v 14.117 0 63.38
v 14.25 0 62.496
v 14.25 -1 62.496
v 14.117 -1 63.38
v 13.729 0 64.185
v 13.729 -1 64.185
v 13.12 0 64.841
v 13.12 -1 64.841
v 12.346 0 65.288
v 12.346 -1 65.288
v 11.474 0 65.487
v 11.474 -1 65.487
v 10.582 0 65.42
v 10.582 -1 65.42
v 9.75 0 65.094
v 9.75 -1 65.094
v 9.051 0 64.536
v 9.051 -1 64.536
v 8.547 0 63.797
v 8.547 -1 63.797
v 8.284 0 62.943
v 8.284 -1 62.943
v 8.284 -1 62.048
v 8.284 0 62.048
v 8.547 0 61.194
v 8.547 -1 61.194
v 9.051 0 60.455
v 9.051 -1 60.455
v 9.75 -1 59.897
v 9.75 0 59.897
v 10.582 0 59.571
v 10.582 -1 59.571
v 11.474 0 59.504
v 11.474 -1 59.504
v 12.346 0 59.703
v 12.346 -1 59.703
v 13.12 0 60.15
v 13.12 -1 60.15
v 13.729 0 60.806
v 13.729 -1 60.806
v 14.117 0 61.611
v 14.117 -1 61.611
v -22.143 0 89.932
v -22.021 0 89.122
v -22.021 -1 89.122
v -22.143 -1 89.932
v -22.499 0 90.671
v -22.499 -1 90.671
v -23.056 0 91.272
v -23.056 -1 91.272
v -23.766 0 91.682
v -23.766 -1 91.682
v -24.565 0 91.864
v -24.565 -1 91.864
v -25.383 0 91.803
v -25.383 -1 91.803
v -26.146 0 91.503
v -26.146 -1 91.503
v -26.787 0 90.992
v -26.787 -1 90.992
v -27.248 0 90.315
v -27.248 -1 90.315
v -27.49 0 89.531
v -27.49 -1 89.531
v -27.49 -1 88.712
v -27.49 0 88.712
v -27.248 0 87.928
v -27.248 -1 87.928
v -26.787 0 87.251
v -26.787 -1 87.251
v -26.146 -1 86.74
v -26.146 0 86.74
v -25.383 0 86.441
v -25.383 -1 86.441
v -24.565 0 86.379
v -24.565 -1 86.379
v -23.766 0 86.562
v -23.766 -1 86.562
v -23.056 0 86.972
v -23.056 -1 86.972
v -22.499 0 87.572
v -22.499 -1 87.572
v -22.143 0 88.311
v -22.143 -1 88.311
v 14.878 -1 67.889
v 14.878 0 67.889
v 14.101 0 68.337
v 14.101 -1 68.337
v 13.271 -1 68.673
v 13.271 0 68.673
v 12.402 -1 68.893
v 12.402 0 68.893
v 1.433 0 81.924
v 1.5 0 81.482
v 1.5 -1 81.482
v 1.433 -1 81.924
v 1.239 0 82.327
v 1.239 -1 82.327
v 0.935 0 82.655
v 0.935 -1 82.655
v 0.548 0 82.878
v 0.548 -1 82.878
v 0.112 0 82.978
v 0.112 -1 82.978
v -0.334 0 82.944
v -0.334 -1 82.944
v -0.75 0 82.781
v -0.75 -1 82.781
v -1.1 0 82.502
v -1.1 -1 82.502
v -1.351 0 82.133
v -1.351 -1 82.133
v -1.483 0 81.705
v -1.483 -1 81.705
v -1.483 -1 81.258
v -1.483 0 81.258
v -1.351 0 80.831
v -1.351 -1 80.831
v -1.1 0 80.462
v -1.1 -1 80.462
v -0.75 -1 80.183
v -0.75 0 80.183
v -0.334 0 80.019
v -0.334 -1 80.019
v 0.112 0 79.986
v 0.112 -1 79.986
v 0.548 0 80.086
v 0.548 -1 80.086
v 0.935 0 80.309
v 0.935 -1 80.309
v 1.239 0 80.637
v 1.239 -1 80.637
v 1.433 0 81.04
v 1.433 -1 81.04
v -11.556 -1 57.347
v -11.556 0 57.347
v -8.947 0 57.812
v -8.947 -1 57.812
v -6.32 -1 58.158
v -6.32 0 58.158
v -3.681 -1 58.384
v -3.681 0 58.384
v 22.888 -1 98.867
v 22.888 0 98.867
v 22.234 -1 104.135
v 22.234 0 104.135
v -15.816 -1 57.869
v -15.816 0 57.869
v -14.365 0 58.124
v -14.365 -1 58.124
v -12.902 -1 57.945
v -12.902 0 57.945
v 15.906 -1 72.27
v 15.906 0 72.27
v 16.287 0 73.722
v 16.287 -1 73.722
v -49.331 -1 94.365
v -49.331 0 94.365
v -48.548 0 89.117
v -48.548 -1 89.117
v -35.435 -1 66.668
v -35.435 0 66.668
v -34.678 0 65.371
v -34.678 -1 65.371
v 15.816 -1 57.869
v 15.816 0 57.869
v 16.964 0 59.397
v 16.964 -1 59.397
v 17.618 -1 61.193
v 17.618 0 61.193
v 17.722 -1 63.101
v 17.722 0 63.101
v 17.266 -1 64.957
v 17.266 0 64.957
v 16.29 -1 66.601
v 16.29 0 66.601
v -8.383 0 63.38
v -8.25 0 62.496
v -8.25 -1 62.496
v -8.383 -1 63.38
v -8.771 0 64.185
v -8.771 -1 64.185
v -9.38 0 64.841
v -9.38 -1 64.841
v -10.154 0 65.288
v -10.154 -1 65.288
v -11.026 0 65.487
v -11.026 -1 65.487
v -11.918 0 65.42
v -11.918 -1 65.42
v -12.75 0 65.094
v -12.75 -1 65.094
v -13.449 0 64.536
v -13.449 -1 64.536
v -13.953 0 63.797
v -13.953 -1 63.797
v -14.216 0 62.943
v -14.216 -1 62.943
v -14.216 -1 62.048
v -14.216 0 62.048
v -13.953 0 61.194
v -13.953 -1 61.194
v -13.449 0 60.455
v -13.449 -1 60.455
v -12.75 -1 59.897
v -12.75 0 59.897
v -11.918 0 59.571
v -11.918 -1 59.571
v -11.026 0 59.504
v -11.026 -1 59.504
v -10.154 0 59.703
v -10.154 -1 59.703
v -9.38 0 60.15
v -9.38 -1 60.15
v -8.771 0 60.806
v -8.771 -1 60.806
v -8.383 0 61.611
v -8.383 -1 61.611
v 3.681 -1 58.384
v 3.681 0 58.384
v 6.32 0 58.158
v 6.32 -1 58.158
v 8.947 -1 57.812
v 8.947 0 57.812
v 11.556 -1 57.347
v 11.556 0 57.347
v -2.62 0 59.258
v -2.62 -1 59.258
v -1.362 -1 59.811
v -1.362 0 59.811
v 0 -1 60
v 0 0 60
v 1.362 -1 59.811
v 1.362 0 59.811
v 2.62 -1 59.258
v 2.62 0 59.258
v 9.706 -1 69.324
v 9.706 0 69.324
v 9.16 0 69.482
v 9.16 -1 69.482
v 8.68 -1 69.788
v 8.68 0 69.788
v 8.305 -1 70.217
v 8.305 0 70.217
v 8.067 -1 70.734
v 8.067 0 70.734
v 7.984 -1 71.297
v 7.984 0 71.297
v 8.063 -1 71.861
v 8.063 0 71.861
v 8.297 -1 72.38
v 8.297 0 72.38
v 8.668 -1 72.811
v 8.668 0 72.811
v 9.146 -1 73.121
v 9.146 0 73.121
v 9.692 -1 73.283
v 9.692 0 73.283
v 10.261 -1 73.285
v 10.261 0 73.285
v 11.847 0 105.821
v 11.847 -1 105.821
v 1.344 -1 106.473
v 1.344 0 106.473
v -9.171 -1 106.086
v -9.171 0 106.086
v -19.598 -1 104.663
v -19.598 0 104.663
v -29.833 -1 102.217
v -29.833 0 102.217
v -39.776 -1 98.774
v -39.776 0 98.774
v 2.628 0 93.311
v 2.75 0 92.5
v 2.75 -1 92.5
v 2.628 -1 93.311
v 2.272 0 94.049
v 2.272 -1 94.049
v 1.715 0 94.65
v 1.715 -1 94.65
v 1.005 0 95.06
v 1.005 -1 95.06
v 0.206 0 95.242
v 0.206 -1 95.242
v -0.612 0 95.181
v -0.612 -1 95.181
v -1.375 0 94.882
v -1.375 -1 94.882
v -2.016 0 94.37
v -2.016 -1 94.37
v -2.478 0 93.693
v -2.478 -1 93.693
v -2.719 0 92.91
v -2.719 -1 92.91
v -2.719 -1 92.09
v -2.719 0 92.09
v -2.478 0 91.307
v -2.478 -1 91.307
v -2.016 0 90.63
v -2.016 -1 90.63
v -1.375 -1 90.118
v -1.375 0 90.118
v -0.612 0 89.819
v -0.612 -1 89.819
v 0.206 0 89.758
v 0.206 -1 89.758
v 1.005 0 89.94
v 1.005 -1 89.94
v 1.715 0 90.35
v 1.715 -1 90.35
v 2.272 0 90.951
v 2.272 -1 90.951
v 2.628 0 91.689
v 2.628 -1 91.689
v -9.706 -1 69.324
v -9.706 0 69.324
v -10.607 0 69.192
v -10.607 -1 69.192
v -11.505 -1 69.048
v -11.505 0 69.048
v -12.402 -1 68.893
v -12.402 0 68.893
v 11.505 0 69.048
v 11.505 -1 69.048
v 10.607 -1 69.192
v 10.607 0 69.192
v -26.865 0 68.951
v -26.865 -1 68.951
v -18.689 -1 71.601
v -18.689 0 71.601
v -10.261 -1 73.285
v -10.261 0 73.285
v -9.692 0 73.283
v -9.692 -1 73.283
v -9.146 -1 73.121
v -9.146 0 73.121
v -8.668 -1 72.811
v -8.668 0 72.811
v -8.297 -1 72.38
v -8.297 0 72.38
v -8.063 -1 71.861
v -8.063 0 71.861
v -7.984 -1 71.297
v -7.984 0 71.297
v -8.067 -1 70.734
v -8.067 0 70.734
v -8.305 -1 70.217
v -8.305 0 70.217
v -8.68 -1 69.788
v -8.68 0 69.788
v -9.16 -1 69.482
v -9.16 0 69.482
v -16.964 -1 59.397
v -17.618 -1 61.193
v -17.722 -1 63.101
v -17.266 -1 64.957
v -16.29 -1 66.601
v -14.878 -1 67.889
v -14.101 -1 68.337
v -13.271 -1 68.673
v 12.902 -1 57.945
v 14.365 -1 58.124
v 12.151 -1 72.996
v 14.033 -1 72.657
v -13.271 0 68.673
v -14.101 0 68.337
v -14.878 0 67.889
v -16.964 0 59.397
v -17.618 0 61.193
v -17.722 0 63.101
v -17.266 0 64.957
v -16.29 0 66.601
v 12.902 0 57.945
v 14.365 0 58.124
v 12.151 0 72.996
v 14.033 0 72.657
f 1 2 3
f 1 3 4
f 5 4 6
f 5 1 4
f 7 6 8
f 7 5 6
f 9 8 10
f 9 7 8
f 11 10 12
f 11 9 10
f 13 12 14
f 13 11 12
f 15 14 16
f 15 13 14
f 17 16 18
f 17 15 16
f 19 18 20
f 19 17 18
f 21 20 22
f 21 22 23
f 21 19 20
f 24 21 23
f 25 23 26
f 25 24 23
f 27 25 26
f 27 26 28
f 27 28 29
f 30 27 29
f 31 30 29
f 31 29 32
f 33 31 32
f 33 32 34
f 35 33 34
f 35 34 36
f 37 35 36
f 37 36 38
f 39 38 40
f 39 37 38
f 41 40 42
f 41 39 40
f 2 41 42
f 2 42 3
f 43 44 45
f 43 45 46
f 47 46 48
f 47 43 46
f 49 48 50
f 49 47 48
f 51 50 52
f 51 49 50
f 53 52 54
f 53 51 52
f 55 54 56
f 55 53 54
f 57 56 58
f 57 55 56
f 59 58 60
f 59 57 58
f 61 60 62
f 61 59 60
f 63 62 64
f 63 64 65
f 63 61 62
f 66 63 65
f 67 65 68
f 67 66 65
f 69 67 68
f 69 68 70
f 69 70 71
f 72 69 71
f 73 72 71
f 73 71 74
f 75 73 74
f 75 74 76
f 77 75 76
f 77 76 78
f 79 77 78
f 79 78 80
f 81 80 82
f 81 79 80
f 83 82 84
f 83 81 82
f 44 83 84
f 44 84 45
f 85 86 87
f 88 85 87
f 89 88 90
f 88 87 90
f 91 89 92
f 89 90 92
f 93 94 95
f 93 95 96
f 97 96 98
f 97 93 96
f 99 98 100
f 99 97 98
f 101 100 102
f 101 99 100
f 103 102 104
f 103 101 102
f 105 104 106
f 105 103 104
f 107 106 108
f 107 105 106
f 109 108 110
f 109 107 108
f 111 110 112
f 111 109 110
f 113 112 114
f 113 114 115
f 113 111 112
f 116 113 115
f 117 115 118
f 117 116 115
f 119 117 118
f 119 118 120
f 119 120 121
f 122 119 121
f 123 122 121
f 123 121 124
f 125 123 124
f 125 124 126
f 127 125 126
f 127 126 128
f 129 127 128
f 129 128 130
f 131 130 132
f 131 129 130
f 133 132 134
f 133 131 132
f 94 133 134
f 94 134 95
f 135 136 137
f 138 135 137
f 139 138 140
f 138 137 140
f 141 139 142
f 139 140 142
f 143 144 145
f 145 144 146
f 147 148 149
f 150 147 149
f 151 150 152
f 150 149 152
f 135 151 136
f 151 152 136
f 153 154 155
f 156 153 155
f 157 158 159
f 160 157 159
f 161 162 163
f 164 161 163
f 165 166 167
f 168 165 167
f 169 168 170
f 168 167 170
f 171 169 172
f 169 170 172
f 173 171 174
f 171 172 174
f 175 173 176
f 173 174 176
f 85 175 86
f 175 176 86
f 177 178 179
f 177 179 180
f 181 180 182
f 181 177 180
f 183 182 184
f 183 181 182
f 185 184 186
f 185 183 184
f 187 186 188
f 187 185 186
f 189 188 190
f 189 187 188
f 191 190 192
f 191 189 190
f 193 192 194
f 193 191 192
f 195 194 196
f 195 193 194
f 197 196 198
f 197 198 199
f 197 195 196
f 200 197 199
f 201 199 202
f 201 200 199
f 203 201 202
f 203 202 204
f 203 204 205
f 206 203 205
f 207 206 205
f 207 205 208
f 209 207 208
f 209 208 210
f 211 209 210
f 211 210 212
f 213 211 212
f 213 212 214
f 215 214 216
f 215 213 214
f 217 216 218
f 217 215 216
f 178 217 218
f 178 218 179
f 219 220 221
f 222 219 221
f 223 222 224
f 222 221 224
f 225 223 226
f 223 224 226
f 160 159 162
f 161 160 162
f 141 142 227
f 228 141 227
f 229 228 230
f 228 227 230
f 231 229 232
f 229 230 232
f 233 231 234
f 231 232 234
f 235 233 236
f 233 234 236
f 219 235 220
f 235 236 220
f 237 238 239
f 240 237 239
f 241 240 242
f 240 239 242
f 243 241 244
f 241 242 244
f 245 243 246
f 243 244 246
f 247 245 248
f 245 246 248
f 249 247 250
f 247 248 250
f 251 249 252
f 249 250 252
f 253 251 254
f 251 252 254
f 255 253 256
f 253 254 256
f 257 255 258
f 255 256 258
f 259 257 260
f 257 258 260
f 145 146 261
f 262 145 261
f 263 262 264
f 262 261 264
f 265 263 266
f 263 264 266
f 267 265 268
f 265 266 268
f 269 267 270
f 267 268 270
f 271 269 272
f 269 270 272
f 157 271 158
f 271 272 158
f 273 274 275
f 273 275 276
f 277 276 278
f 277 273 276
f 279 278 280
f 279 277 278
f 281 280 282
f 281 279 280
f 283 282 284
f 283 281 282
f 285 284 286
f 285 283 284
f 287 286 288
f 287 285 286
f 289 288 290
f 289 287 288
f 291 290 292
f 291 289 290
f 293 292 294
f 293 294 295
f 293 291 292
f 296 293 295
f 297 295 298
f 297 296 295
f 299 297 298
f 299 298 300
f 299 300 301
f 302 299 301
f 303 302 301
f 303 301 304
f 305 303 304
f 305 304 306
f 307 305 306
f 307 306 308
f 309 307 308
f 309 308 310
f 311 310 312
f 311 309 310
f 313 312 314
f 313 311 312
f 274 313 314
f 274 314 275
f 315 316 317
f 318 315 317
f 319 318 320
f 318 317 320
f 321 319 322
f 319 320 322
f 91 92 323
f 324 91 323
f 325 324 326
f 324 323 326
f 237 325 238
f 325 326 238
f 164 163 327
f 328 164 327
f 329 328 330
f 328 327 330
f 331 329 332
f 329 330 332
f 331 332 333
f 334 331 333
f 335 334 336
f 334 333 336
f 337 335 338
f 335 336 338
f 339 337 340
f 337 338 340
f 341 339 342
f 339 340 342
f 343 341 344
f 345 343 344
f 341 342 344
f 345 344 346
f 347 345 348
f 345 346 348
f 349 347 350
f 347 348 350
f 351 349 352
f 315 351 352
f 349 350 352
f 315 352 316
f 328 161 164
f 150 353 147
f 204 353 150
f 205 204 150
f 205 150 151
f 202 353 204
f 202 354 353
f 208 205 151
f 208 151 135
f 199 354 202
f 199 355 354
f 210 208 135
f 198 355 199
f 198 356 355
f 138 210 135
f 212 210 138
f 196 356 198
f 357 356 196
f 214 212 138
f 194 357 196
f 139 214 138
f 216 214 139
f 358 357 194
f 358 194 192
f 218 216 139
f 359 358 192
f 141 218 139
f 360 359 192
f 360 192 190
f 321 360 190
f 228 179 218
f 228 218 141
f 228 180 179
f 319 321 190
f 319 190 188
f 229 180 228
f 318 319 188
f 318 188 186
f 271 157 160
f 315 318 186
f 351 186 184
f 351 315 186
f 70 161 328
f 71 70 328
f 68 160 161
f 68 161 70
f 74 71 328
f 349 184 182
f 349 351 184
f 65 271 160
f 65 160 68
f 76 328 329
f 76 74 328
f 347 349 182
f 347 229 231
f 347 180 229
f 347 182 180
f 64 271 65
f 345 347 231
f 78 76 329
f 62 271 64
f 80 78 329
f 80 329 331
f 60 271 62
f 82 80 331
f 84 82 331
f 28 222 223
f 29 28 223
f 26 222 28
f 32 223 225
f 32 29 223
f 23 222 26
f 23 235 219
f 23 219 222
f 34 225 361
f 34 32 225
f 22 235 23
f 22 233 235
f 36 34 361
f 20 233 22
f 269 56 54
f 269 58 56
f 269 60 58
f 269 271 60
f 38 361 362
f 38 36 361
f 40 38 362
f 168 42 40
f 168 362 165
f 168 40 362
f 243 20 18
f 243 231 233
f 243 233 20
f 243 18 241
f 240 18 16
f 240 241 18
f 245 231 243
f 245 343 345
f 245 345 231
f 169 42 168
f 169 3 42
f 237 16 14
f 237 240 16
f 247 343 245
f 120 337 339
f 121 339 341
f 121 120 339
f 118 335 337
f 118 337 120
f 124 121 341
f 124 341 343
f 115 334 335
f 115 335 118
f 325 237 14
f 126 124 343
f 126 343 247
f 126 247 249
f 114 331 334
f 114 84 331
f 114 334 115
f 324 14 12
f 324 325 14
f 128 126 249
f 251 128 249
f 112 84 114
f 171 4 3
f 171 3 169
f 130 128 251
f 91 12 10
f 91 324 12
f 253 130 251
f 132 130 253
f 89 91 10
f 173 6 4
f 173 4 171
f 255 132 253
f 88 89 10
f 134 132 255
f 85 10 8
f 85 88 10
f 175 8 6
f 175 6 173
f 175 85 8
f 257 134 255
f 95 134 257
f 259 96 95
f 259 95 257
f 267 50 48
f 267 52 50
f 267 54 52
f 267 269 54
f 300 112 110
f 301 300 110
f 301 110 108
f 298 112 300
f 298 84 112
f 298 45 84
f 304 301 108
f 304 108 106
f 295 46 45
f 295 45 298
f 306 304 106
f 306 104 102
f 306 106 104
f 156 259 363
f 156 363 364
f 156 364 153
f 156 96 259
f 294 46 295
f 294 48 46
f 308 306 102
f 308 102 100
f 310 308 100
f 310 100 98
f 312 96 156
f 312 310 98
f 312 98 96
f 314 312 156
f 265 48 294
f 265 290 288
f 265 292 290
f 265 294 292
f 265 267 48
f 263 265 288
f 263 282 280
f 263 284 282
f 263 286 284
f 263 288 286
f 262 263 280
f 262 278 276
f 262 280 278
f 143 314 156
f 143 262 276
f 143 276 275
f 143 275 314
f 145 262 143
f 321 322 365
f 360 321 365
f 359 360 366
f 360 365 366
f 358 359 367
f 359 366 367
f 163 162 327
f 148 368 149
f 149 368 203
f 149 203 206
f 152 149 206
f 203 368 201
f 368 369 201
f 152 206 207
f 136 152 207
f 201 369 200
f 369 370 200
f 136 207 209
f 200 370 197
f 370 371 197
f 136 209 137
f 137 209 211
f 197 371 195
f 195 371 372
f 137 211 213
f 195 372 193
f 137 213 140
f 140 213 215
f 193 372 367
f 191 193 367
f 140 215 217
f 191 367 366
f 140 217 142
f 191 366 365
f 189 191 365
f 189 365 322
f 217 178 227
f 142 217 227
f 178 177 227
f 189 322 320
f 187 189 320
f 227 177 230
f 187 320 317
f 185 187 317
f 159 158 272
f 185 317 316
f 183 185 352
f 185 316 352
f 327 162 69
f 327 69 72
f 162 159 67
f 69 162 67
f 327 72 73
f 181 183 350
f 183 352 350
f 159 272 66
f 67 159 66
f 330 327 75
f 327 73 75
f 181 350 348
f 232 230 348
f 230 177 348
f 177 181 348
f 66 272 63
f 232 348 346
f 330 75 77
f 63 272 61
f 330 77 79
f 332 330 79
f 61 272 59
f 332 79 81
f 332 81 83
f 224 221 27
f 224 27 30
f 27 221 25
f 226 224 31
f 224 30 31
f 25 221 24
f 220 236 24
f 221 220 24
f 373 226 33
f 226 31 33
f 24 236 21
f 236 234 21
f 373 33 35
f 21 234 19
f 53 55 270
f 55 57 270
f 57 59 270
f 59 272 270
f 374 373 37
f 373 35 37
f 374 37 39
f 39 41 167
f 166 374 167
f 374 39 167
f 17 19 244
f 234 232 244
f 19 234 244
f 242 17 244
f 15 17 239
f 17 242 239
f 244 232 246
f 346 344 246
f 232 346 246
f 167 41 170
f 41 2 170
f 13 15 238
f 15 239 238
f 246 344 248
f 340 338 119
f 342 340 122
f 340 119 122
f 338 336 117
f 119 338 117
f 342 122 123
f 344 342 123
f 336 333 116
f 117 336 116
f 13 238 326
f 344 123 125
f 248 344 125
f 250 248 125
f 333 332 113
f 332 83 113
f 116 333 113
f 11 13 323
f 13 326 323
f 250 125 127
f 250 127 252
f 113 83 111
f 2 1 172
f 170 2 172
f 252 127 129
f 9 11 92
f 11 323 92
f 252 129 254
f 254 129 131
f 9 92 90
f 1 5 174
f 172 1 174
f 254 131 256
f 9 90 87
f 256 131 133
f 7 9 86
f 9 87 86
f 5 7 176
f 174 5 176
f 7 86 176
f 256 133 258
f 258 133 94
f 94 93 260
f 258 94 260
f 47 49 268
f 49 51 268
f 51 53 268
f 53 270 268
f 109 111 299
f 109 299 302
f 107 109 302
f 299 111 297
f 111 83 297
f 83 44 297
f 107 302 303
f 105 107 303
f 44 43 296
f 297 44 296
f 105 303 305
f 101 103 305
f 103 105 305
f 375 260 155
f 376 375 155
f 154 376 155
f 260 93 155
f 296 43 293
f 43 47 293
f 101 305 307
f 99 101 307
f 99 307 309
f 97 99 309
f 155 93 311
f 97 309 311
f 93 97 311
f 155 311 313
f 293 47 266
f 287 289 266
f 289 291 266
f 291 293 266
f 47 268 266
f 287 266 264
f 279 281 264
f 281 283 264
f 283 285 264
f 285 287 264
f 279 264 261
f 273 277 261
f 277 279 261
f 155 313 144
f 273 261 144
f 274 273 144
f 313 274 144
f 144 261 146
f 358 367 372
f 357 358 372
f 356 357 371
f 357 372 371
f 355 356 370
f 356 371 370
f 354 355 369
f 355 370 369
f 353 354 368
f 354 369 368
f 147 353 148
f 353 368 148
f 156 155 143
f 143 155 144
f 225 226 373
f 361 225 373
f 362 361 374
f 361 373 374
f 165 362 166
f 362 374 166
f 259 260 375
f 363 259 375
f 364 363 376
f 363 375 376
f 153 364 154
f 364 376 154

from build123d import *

# Parameters (mm, degrees)
F0_R     = 3
F0_R_2   = 2.75
F0_R_3   = 1.5
F1_DEPTH = 1


# Not quite as in the source:
# - ends of sketch curves that miss each other by under 0.0002 mm in the source are joined


with BuildPart() as f1:
    # F0 (on Front) → F1 (new body)
    with BuildSketch(Plane.XZ):
        with BuildLine():
            ThreePointArc((10.2610980266, 73.2851271902), (13.0931802752, 72.8324696154), (15.9055950445, 72.2704092024))
            Line((15.9055950445, 72.2704092024), (16.286797, 73.722386))
            Line((16.286797, 73.722386), (22.888167, 98.86666))
            Line((22.888167, 98.86666), (22.234036, 104.134663))
            ThreePointArc((22.234036, 104.134663), (-14.4021915305, 105.5033516635), (-49.3311389264, 94.3653488593))
            Line((-49.3311389264, 94.3653488593), (-48.548236, 89.117403))
            Line((-48.548236, 89.117403), (-35.435226, 66.667794))
            Line((-35.435226, 66.667794), (-34.67805, 65.371499))
            ThreePointArc((-34.67805, 65.371499), (-22.8153047874, 70.3950414977), (-10.2610980266, 73.2851271902))
            ThreePointArc((-10.2610980266, 73.2851271902), (-8.0030918925, 71.581775015), (-9.706443985, 69.3237688925))
            ThreePointArc((-9.706443985, 69.3237688925), (-11.056110798, 69.1213600418), (-12.4015749915, 68.8926769529))
            ThreePointArc((-12.4015749915, 68.8926769529), (-13.6918696678, 68.5193918089), (-14.8778891297, 67.8888681928))
            ThreePointArc((-14.8778891297, 67.8888681928), (-17.7216913701, 63.1014792158), (-15.8160679868, 57.8693760134))
            ThreePointArc((-15.8160679868, 57.8693760134), (-13.6269577418, 58.088804993), (-11.5555822107, 57.3473496681))
            ThreePointArc((-11.5555822107, 57.3473496681), (-7.6357821132, 57.9995244077), (-3.6807509947, 58.3840909162))
            ThreePointArc((-3.6807509947, 58.3840909162), (0, 60), (3.6807510132, 58.3840910122))
            ThreePointArc((3.6807510132, 58.3840910122), (7.6357821132, 57.9995244077), (11.5555819538, 57.3473497706))
            ThreePointArc((11.5555819538, 57.3473497706), (13.6269577418, 58.088804993), (15.8160679296, 57.8693757888))
            ThreePointArc((15.8160679296, 57.8693757888), (17.7216913701, 63.1014792158), (14.8778891297, 67.8888681928))
            ThreePointArc((14.8778891297, 67.8888681928), (13.6918696678, 68.5193918089), (12.4015750198, 68.8926771098))
            ThreePointArc((12.4015750198, 68.8926771098), (11.056110798, 69.1213600418), (9.7064439965, 69.3237689753))
            ThreePointArc((9.7064439965, 69.3237689753), (8.0030918925, 71.581775015), (10.2610980266, 73.2851271902))
        make_face()
        with Locations((-11.25, 62.4955)):
            Circle(F0_R, mode=Mode.SUBTRACT)
        with Locations((-24.770679, 89.121622)):
            Circle(F0_R_2, mode=Mode.SUBTRACT)
        with Locations((0, 81.481831)):
            Circle(F0_R_3, mode=Mode.SUBTRACT)
        with Locations((0, 92.5)):
            Circle(F0_R_2, mode=Mode.SUBTRACT)
        with Locations((11.25, 62.4955)):
            Circle(F0_R, mode=Mode.SUBTRACT)
    extrude(amount=F1_DEPTH)


solid = f1.part
